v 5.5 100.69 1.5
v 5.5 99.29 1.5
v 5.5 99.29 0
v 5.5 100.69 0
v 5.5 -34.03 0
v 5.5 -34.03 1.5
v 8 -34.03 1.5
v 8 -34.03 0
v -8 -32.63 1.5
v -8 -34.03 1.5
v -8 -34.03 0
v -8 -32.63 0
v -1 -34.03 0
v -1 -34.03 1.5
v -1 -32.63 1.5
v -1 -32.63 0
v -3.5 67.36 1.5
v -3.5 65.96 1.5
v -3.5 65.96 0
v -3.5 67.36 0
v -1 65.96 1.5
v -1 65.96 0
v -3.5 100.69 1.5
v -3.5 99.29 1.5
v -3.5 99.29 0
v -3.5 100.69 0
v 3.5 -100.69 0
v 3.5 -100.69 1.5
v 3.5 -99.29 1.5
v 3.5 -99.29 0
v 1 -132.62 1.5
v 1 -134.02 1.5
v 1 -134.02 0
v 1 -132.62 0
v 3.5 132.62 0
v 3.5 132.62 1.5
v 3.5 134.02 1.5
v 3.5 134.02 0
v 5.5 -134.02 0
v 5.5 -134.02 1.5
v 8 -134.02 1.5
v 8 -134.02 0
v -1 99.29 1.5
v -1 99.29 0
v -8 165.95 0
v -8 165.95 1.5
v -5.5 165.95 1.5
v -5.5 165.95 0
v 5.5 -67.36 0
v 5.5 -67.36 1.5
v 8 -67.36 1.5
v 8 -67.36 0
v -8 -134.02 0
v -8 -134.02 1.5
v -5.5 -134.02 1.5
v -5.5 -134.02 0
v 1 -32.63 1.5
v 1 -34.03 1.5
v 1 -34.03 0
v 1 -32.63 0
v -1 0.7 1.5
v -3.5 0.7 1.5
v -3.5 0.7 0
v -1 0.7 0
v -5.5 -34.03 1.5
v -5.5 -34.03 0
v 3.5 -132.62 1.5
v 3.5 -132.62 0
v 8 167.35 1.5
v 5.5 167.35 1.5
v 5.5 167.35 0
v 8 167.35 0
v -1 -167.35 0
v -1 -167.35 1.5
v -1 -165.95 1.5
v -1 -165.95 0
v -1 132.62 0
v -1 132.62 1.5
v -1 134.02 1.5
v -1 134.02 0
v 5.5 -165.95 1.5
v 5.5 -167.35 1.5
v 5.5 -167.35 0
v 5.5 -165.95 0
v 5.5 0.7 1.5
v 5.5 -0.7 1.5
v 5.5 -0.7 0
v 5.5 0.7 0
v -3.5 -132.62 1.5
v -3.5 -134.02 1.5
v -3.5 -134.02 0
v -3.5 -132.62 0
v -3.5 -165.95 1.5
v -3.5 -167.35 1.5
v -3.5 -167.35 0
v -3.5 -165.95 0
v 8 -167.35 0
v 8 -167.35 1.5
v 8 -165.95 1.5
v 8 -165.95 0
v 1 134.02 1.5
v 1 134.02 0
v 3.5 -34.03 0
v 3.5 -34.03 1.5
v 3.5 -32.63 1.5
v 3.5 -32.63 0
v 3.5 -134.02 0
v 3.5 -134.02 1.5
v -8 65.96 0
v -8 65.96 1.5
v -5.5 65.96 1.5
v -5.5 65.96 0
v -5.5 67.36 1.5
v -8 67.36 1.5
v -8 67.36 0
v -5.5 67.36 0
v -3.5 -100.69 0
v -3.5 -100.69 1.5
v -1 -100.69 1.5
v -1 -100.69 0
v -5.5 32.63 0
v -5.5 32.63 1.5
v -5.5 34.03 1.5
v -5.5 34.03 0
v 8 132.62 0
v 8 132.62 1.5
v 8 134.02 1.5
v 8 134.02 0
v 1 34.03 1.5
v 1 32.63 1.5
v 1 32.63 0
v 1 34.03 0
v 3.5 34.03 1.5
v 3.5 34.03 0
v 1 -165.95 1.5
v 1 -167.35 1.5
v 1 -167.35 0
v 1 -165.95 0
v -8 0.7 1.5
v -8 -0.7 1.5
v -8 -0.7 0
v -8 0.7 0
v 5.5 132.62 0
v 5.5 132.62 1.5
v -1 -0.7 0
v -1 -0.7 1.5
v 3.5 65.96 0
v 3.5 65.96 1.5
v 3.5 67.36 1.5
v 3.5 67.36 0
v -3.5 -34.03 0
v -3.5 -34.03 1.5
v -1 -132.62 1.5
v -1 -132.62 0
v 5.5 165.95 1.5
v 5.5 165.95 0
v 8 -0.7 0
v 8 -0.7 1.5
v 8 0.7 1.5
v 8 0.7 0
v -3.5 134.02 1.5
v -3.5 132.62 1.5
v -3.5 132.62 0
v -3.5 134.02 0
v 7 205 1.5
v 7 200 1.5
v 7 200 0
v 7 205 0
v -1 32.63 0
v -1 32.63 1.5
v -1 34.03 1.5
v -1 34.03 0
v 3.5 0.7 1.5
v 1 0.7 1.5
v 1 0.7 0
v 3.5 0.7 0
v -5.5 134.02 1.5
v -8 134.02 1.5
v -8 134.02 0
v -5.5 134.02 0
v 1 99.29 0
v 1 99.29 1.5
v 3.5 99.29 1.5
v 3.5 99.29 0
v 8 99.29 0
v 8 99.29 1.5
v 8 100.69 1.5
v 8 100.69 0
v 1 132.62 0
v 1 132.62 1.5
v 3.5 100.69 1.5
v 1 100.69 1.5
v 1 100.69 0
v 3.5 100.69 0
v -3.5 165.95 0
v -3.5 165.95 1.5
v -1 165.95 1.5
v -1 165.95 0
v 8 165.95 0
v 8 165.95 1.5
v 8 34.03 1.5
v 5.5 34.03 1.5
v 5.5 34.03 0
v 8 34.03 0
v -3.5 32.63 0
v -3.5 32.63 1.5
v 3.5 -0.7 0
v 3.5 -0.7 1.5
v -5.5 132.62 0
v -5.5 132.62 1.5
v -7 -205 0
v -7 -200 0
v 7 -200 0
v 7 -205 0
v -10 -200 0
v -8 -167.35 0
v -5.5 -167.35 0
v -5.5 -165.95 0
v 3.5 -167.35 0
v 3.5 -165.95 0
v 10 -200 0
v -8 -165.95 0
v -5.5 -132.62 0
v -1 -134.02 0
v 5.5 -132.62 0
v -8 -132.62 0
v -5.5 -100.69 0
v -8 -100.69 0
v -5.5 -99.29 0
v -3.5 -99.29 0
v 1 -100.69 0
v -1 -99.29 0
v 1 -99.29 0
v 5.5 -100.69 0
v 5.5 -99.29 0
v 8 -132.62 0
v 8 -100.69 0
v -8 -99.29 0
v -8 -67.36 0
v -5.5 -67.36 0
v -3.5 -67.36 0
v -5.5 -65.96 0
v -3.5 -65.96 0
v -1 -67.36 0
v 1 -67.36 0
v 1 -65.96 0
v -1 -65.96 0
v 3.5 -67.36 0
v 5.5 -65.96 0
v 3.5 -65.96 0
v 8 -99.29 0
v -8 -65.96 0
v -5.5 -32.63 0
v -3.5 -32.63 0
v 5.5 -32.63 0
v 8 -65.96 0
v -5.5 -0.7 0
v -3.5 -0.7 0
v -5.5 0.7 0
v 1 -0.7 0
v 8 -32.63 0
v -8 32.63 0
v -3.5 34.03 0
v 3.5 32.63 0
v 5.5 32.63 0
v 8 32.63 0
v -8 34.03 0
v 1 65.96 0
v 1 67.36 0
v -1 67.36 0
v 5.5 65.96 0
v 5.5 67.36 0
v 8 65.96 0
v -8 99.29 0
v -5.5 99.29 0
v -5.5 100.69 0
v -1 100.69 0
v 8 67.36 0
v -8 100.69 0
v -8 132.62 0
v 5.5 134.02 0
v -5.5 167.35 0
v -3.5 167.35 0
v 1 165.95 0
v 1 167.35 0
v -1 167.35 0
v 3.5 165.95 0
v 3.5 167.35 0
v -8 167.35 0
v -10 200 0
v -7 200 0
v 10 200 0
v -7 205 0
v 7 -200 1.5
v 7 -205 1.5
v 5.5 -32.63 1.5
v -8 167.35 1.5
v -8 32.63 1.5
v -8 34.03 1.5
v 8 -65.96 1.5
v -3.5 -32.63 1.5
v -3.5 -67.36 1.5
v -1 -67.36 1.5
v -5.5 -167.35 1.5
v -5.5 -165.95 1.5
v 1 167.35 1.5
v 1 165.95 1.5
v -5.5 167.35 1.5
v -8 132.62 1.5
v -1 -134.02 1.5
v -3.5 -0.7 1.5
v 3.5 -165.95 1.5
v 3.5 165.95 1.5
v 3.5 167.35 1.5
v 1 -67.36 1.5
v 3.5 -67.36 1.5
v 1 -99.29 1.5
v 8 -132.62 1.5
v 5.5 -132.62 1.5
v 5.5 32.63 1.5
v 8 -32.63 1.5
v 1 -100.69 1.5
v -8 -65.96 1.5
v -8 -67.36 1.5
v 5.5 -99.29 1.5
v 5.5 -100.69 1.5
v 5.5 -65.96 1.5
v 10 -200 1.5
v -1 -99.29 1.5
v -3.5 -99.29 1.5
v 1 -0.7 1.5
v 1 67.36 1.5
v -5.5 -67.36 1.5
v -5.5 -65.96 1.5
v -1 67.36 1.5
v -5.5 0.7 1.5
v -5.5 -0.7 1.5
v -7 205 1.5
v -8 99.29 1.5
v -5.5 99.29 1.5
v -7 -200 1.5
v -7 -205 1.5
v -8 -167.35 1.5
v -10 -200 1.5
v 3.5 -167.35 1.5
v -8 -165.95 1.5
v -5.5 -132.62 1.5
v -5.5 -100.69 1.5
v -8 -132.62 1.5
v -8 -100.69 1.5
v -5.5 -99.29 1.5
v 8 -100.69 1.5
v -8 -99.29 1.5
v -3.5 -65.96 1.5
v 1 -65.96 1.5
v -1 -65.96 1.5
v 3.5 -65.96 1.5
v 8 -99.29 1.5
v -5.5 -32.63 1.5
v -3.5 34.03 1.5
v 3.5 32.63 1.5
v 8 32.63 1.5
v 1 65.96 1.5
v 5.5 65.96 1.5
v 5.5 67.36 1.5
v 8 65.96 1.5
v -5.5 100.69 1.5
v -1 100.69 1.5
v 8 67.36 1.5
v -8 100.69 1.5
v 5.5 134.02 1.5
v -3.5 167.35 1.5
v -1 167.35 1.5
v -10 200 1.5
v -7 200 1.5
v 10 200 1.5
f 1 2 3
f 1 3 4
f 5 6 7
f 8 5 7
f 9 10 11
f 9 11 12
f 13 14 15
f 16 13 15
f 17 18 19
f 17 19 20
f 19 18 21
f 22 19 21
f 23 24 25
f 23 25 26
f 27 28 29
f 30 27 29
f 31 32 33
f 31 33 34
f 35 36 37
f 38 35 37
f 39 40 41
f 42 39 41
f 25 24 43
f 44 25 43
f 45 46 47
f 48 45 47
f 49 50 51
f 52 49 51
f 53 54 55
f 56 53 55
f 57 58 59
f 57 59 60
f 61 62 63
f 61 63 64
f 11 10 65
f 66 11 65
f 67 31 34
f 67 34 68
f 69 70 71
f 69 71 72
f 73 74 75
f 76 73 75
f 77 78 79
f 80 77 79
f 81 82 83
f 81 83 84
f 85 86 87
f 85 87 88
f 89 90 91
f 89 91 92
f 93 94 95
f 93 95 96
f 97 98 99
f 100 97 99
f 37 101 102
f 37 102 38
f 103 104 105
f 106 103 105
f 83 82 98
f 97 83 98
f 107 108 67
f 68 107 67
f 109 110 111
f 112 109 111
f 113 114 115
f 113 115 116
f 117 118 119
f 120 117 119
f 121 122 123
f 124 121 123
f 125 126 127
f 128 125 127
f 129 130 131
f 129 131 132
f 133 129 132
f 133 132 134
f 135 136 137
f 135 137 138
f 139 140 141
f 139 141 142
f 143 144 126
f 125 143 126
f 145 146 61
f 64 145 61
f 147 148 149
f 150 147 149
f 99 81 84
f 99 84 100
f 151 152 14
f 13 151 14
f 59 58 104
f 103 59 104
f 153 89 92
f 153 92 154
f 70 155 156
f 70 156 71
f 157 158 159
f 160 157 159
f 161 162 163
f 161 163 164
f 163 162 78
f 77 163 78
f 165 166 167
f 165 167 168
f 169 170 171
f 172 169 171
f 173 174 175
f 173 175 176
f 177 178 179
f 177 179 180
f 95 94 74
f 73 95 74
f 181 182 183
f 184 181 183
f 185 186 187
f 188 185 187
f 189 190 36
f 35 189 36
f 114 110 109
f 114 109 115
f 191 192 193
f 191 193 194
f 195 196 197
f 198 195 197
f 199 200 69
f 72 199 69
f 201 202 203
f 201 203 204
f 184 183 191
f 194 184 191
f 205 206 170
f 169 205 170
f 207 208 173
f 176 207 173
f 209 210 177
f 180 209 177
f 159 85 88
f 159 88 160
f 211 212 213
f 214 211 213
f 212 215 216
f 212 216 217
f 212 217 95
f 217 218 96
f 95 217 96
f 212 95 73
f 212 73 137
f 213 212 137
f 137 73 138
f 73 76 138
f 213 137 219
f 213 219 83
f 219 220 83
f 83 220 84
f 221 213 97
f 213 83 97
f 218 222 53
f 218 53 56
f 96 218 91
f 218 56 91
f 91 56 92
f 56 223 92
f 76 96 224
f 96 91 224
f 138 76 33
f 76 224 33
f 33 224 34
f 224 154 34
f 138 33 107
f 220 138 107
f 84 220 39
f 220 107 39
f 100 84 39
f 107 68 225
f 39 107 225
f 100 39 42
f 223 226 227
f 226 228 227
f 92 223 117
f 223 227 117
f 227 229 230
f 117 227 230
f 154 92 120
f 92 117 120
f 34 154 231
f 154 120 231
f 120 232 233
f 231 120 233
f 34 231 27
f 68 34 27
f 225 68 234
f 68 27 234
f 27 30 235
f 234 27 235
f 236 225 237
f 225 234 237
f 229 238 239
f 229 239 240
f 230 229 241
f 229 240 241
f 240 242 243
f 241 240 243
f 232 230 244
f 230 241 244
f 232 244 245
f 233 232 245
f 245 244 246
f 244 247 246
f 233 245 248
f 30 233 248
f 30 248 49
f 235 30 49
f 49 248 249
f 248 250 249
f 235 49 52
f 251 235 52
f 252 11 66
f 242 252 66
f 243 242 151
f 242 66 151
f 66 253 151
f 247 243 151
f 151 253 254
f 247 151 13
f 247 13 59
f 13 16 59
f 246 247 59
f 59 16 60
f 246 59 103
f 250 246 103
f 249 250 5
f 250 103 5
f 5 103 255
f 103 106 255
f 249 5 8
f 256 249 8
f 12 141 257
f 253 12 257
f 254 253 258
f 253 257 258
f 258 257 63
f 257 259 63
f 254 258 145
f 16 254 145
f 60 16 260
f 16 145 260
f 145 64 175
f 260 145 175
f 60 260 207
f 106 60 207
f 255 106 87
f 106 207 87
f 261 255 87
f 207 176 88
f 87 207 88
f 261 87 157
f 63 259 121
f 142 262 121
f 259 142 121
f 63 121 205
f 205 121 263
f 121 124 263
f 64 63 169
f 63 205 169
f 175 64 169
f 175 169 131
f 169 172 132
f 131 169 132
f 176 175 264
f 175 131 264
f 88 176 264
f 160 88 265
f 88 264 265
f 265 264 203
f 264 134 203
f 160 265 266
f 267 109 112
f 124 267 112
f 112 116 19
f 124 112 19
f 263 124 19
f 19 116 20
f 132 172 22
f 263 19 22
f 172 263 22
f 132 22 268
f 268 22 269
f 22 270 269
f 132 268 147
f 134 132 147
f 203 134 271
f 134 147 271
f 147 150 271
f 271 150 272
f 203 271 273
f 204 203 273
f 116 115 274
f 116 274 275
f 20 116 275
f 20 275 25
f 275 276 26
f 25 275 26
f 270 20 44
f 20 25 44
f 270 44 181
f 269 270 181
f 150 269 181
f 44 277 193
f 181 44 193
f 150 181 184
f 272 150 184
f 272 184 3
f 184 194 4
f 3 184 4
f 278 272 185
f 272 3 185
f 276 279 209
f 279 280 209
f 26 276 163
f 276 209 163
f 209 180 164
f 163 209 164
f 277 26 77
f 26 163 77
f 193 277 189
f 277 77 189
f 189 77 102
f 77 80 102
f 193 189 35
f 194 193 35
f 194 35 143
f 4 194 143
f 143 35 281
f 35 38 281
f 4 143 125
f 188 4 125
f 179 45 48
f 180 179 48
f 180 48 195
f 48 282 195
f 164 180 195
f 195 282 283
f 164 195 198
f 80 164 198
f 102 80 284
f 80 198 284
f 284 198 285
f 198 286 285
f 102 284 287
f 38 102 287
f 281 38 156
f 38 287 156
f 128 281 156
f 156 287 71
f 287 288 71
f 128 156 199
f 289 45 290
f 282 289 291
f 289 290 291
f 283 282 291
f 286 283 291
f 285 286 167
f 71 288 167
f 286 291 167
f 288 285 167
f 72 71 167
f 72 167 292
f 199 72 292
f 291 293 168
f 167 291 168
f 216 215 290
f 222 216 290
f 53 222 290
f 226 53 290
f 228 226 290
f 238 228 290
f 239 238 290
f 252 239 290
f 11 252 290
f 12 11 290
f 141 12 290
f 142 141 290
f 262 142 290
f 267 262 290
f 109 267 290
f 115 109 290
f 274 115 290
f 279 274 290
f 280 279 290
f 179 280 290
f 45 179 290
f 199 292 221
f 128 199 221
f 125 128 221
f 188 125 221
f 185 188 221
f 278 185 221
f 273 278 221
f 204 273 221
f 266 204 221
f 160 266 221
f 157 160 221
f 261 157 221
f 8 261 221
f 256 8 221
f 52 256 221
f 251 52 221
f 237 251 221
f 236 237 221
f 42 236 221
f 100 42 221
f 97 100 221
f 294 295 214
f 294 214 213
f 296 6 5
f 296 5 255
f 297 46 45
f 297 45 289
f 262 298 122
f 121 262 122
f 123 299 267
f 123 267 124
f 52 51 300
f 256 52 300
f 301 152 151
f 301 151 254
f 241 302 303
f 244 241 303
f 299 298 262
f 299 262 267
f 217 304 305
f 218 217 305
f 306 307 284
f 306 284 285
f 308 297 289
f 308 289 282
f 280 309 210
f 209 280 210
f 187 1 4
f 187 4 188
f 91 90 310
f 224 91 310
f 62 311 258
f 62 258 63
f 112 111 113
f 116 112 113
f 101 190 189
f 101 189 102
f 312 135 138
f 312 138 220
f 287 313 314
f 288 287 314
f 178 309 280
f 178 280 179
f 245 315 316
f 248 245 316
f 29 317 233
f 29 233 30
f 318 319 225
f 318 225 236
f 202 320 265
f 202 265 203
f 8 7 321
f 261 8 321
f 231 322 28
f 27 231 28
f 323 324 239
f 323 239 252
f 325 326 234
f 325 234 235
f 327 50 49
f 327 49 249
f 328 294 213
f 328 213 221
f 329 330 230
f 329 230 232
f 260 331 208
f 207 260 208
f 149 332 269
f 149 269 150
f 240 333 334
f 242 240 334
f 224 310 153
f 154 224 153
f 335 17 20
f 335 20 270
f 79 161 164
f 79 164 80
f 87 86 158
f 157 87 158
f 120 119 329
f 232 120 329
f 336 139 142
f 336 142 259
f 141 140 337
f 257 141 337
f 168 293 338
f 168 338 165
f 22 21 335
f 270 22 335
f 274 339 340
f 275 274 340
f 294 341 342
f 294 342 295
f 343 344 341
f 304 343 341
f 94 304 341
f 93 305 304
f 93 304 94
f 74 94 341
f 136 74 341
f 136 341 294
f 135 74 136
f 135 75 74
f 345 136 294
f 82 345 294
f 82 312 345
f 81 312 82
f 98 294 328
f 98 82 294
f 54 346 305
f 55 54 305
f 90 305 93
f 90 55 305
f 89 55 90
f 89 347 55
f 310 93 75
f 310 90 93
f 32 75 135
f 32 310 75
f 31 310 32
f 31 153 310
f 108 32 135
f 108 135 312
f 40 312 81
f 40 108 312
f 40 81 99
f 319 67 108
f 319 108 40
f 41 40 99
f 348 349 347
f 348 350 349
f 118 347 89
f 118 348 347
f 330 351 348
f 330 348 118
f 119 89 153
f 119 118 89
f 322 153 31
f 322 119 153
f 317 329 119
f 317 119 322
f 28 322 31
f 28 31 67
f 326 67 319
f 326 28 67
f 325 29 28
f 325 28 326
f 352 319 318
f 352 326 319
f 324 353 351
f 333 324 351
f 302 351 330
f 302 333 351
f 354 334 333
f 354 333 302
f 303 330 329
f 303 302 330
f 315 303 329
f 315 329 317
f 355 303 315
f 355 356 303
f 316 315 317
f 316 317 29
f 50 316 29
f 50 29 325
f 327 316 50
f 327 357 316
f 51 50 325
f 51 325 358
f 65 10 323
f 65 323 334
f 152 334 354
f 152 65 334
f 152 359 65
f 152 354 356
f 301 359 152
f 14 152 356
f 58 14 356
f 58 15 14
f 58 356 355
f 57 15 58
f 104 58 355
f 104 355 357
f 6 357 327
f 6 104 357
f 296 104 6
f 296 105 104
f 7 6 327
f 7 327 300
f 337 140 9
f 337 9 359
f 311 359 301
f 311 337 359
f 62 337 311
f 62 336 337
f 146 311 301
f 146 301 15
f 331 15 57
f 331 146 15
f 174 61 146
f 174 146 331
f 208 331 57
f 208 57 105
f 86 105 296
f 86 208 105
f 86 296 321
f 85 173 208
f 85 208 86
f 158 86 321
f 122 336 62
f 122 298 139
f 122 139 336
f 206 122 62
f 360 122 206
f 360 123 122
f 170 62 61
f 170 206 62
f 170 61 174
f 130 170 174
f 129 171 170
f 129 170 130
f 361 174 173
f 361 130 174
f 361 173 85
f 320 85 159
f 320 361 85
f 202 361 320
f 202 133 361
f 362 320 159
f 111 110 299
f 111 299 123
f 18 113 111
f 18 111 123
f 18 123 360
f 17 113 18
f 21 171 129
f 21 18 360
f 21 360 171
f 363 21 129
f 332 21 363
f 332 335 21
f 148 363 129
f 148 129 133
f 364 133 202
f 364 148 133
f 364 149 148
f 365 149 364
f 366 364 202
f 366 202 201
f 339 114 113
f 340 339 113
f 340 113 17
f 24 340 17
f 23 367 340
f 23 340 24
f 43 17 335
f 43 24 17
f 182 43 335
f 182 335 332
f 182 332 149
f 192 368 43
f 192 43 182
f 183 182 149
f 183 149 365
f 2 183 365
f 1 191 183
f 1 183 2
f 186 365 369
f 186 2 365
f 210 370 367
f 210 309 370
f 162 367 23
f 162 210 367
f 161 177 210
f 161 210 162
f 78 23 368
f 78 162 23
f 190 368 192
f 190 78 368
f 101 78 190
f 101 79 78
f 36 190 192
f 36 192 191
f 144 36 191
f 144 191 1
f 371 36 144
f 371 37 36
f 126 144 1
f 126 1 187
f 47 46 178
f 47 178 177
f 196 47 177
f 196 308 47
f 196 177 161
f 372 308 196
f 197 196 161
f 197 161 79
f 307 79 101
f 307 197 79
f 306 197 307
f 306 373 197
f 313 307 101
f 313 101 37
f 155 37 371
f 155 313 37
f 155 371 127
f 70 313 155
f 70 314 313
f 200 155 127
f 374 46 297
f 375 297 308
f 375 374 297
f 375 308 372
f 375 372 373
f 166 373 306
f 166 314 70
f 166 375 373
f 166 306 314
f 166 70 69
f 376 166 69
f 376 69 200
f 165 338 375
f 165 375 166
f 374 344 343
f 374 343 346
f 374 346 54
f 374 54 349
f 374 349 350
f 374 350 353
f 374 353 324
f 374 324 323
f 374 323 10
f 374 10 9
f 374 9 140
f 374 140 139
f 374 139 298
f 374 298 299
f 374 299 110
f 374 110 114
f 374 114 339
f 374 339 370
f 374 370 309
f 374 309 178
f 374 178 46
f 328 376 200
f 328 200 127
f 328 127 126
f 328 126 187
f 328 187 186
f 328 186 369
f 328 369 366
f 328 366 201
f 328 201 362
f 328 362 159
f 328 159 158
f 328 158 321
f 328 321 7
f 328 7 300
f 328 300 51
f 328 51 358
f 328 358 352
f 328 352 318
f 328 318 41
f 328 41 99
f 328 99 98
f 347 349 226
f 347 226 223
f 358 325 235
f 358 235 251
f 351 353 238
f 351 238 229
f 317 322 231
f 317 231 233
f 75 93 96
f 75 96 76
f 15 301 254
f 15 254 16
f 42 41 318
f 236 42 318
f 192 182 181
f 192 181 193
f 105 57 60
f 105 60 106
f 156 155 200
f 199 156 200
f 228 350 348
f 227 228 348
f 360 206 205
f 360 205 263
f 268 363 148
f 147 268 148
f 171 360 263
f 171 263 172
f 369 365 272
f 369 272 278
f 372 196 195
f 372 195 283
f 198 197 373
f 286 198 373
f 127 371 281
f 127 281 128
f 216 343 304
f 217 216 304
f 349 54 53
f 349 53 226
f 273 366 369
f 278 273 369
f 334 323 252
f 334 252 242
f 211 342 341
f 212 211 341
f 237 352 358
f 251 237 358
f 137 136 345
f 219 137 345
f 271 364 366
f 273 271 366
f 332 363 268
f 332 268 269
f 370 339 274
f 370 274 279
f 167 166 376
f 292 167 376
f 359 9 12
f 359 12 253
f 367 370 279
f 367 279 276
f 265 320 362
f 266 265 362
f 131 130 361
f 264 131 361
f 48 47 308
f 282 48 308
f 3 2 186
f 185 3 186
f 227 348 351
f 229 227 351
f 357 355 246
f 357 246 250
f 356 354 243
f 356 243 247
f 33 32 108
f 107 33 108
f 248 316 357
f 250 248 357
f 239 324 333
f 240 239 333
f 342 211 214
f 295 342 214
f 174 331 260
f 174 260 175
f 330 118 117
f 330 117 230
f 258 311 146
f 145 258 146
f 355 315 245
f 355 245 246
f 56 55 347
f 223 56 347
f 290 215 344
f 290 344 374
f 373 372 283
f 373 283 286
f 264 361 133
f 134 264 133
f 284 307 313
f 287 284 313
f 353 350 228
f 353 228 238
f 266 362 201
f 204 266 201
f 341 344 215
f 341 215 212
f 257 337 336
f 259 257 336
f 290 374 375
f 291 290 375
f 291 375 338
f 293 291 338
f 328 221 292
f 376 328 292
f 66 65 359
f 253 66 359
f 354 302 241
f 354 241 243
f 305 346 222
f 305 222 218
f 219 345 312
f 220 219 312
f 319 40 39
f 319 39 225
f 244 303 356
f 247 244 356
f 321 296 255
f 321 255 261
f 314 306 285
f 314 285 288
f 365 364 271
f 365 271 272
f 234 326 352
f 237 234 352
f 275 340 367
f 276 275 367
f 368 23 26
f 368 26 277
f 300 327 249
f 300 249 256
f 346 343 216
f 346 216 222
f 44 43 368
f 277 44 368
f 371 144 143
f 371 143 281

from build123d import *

# Parameters (mm, degrees)
SKETCH_1_W                 = 20
SKETCH_1_H                 = 410
EXTRUDE_1_DEPTH            = 1.5
CUT_EXTRUDE_1_REACH        = 3.5
SKETCH_2_W                 = 3
SKETCH_2_H                 = 5
SKETCH_3_W                 = 2.5
SKETCH_3_H                 = 1.4
CUT_EXTRUDE_2_DEPTH        = 1.5
PATTERN_LINEAR_1_COUNT     = 6
PATTERN_LINEAR_1_PITCH     = 33.33
PATTERN_LINEAR_1_COL_COUNT = 6
PATTERN_LINEAR_1_COL_PITCH = 33.33


with BuildPart() as part:
    # 草图1 → 凸台-拉伸1 (new body)
    with BuildSketch(Plane.XY):
        Rectangle(SKETCH_1_W, SKETCH_1_H)
    extrude(amount=EXTRUDE_1_DEPTH)

    # 草图2 → 切除-拉伸1 (cut, up to next)
    with BuildSketch(Plane.XY.offset(1.5), mode=Mode.PRIVATE) as cut_extrude_1_sk1:
        with Locations((-8.5, 202.5)):
            Rectangle(SKETCH_2_W, SKETCH_2_H)
    cut_extrude_1_tool1 = extrude(cut_extrude_1_sk1.sketch, amount=-CUT_EXTRUDE_1_REACH, mode=Mode.PRIVATE) & part.part
    add(cut_extrude_1_tool1.solids().sort_by_distance((-8.5, 202.5, 1.5))[0], mode=Mode.SUBTRACT)
    # 草图2 → 切除-拉伸1 (cut, up to next)
    with BuildSketch(Plane.XY.offset(1.5), mode=Mode.PRIVATE) as cut_extrude_1_sk2:
        with Locations((8.5, 202.5)):
            Rectangle(SKETCH_2_W, SKETCH_2_H)
    cut_extrude_1_tool2 = extrude(cut_extrude_1_sk2.sketch, amount=-CUT_EXTRUDE_1_REACH, mode=Mode.PRIVATE) & part.part
    add(cut_extrude_1_tool2.solids().sort_by_distance((8.5, 202.5, 1.5))[0], mode=Mode.SUBTRACT)
    # 草图2 → 切除-拉伸1 (cut, up to next)
    with BuildSketch(Plane.XY.offset(1.5), mode=Mode.PRIVATE) as cut_extrude_1_sk3:
        with Locations((-8.5, -202.5)):
            Rectangle(SKETCH_2_W, SKETCH_2_H)
    cut_extrude_1_tool3 = extrude(cut_extrude_1_sk3.sketch, amount=-CUT_EXTRUDE_1_REACH, mode=Mode.PRIVATE) & part.part
    add(cut_extrude_1_tool3.solids().sort_by_distance((-8.5, -202.5, 1.5))[0], mode=Mode.SUBTRACT)
    # 草图2 → 切除-拉伸1 (cut, up to next)
    with BuildSketch(Plane.XY.offset(1.5), mode=Mode.PRIVATE) as cut_extrude_1_sk4:
        with Locations((8.5, -202.5)):
            Rectangle(SKETCH_2_W, SKETCH_2_H)
    cut_extrude_1_tool4 = extrude(cut_extrude_1_sk4.sketch, amount=-CUT_EXTRUDE_1_REACH, mode=Mode.PRIVATE) & part.part
    add(cut_extrude_1_tool4.solids().sort_by_distance((8.5, -202.5, 1.5))[0], mode=Mode.SUBTRACT)

    # 草图3 → 切除-拉伸2 (cut)
    with BuildSketch(Plane.XY.offset(1.5)):
        with Locations((-6.75, 0)):
            Rectangle(SKETCH_3_W, SKETCH_3_H)
        with Locations((-2.25, 0)):
            Rectangle(SKETCH_3_W, SKETCH_3_H)
        with Locations((2.25, 0)):
            Rectangle(SKETCH_3_W, SKETCH_3_H)
        with Locations((6.75, 0)):
            Rectangle(SKETCH_3_W, SKETCH_3_H)
    cut_extrude_2 = extrude(amount=-CUT_EXTRUDE_2_DEPTH, mode=Mode.SUBTRACT)

    # 阵列(线性)1: 切除-拉伸2 ×6
    with Locations(*[(0, -i * PATTERN_LINEAR_1_PITCH, 0) for i in range(1, PATTERN_LINEAR_1_COUNT)]):
        add(cut_extrude_2, mode=Mode.SUBTRACT)

    # 阵列(线性)1 col: 切除-拉伸2 ×6
    with Locations(*[(0, i * PATTERN_LINEAR_1_COL_PITCH, 0) for i in range(1, PATTERN_LINEAR_1_COL_COUNT)]):
        add(cut_extrude_2, mode=Mode.SUBTRACT)


solid = part.part
